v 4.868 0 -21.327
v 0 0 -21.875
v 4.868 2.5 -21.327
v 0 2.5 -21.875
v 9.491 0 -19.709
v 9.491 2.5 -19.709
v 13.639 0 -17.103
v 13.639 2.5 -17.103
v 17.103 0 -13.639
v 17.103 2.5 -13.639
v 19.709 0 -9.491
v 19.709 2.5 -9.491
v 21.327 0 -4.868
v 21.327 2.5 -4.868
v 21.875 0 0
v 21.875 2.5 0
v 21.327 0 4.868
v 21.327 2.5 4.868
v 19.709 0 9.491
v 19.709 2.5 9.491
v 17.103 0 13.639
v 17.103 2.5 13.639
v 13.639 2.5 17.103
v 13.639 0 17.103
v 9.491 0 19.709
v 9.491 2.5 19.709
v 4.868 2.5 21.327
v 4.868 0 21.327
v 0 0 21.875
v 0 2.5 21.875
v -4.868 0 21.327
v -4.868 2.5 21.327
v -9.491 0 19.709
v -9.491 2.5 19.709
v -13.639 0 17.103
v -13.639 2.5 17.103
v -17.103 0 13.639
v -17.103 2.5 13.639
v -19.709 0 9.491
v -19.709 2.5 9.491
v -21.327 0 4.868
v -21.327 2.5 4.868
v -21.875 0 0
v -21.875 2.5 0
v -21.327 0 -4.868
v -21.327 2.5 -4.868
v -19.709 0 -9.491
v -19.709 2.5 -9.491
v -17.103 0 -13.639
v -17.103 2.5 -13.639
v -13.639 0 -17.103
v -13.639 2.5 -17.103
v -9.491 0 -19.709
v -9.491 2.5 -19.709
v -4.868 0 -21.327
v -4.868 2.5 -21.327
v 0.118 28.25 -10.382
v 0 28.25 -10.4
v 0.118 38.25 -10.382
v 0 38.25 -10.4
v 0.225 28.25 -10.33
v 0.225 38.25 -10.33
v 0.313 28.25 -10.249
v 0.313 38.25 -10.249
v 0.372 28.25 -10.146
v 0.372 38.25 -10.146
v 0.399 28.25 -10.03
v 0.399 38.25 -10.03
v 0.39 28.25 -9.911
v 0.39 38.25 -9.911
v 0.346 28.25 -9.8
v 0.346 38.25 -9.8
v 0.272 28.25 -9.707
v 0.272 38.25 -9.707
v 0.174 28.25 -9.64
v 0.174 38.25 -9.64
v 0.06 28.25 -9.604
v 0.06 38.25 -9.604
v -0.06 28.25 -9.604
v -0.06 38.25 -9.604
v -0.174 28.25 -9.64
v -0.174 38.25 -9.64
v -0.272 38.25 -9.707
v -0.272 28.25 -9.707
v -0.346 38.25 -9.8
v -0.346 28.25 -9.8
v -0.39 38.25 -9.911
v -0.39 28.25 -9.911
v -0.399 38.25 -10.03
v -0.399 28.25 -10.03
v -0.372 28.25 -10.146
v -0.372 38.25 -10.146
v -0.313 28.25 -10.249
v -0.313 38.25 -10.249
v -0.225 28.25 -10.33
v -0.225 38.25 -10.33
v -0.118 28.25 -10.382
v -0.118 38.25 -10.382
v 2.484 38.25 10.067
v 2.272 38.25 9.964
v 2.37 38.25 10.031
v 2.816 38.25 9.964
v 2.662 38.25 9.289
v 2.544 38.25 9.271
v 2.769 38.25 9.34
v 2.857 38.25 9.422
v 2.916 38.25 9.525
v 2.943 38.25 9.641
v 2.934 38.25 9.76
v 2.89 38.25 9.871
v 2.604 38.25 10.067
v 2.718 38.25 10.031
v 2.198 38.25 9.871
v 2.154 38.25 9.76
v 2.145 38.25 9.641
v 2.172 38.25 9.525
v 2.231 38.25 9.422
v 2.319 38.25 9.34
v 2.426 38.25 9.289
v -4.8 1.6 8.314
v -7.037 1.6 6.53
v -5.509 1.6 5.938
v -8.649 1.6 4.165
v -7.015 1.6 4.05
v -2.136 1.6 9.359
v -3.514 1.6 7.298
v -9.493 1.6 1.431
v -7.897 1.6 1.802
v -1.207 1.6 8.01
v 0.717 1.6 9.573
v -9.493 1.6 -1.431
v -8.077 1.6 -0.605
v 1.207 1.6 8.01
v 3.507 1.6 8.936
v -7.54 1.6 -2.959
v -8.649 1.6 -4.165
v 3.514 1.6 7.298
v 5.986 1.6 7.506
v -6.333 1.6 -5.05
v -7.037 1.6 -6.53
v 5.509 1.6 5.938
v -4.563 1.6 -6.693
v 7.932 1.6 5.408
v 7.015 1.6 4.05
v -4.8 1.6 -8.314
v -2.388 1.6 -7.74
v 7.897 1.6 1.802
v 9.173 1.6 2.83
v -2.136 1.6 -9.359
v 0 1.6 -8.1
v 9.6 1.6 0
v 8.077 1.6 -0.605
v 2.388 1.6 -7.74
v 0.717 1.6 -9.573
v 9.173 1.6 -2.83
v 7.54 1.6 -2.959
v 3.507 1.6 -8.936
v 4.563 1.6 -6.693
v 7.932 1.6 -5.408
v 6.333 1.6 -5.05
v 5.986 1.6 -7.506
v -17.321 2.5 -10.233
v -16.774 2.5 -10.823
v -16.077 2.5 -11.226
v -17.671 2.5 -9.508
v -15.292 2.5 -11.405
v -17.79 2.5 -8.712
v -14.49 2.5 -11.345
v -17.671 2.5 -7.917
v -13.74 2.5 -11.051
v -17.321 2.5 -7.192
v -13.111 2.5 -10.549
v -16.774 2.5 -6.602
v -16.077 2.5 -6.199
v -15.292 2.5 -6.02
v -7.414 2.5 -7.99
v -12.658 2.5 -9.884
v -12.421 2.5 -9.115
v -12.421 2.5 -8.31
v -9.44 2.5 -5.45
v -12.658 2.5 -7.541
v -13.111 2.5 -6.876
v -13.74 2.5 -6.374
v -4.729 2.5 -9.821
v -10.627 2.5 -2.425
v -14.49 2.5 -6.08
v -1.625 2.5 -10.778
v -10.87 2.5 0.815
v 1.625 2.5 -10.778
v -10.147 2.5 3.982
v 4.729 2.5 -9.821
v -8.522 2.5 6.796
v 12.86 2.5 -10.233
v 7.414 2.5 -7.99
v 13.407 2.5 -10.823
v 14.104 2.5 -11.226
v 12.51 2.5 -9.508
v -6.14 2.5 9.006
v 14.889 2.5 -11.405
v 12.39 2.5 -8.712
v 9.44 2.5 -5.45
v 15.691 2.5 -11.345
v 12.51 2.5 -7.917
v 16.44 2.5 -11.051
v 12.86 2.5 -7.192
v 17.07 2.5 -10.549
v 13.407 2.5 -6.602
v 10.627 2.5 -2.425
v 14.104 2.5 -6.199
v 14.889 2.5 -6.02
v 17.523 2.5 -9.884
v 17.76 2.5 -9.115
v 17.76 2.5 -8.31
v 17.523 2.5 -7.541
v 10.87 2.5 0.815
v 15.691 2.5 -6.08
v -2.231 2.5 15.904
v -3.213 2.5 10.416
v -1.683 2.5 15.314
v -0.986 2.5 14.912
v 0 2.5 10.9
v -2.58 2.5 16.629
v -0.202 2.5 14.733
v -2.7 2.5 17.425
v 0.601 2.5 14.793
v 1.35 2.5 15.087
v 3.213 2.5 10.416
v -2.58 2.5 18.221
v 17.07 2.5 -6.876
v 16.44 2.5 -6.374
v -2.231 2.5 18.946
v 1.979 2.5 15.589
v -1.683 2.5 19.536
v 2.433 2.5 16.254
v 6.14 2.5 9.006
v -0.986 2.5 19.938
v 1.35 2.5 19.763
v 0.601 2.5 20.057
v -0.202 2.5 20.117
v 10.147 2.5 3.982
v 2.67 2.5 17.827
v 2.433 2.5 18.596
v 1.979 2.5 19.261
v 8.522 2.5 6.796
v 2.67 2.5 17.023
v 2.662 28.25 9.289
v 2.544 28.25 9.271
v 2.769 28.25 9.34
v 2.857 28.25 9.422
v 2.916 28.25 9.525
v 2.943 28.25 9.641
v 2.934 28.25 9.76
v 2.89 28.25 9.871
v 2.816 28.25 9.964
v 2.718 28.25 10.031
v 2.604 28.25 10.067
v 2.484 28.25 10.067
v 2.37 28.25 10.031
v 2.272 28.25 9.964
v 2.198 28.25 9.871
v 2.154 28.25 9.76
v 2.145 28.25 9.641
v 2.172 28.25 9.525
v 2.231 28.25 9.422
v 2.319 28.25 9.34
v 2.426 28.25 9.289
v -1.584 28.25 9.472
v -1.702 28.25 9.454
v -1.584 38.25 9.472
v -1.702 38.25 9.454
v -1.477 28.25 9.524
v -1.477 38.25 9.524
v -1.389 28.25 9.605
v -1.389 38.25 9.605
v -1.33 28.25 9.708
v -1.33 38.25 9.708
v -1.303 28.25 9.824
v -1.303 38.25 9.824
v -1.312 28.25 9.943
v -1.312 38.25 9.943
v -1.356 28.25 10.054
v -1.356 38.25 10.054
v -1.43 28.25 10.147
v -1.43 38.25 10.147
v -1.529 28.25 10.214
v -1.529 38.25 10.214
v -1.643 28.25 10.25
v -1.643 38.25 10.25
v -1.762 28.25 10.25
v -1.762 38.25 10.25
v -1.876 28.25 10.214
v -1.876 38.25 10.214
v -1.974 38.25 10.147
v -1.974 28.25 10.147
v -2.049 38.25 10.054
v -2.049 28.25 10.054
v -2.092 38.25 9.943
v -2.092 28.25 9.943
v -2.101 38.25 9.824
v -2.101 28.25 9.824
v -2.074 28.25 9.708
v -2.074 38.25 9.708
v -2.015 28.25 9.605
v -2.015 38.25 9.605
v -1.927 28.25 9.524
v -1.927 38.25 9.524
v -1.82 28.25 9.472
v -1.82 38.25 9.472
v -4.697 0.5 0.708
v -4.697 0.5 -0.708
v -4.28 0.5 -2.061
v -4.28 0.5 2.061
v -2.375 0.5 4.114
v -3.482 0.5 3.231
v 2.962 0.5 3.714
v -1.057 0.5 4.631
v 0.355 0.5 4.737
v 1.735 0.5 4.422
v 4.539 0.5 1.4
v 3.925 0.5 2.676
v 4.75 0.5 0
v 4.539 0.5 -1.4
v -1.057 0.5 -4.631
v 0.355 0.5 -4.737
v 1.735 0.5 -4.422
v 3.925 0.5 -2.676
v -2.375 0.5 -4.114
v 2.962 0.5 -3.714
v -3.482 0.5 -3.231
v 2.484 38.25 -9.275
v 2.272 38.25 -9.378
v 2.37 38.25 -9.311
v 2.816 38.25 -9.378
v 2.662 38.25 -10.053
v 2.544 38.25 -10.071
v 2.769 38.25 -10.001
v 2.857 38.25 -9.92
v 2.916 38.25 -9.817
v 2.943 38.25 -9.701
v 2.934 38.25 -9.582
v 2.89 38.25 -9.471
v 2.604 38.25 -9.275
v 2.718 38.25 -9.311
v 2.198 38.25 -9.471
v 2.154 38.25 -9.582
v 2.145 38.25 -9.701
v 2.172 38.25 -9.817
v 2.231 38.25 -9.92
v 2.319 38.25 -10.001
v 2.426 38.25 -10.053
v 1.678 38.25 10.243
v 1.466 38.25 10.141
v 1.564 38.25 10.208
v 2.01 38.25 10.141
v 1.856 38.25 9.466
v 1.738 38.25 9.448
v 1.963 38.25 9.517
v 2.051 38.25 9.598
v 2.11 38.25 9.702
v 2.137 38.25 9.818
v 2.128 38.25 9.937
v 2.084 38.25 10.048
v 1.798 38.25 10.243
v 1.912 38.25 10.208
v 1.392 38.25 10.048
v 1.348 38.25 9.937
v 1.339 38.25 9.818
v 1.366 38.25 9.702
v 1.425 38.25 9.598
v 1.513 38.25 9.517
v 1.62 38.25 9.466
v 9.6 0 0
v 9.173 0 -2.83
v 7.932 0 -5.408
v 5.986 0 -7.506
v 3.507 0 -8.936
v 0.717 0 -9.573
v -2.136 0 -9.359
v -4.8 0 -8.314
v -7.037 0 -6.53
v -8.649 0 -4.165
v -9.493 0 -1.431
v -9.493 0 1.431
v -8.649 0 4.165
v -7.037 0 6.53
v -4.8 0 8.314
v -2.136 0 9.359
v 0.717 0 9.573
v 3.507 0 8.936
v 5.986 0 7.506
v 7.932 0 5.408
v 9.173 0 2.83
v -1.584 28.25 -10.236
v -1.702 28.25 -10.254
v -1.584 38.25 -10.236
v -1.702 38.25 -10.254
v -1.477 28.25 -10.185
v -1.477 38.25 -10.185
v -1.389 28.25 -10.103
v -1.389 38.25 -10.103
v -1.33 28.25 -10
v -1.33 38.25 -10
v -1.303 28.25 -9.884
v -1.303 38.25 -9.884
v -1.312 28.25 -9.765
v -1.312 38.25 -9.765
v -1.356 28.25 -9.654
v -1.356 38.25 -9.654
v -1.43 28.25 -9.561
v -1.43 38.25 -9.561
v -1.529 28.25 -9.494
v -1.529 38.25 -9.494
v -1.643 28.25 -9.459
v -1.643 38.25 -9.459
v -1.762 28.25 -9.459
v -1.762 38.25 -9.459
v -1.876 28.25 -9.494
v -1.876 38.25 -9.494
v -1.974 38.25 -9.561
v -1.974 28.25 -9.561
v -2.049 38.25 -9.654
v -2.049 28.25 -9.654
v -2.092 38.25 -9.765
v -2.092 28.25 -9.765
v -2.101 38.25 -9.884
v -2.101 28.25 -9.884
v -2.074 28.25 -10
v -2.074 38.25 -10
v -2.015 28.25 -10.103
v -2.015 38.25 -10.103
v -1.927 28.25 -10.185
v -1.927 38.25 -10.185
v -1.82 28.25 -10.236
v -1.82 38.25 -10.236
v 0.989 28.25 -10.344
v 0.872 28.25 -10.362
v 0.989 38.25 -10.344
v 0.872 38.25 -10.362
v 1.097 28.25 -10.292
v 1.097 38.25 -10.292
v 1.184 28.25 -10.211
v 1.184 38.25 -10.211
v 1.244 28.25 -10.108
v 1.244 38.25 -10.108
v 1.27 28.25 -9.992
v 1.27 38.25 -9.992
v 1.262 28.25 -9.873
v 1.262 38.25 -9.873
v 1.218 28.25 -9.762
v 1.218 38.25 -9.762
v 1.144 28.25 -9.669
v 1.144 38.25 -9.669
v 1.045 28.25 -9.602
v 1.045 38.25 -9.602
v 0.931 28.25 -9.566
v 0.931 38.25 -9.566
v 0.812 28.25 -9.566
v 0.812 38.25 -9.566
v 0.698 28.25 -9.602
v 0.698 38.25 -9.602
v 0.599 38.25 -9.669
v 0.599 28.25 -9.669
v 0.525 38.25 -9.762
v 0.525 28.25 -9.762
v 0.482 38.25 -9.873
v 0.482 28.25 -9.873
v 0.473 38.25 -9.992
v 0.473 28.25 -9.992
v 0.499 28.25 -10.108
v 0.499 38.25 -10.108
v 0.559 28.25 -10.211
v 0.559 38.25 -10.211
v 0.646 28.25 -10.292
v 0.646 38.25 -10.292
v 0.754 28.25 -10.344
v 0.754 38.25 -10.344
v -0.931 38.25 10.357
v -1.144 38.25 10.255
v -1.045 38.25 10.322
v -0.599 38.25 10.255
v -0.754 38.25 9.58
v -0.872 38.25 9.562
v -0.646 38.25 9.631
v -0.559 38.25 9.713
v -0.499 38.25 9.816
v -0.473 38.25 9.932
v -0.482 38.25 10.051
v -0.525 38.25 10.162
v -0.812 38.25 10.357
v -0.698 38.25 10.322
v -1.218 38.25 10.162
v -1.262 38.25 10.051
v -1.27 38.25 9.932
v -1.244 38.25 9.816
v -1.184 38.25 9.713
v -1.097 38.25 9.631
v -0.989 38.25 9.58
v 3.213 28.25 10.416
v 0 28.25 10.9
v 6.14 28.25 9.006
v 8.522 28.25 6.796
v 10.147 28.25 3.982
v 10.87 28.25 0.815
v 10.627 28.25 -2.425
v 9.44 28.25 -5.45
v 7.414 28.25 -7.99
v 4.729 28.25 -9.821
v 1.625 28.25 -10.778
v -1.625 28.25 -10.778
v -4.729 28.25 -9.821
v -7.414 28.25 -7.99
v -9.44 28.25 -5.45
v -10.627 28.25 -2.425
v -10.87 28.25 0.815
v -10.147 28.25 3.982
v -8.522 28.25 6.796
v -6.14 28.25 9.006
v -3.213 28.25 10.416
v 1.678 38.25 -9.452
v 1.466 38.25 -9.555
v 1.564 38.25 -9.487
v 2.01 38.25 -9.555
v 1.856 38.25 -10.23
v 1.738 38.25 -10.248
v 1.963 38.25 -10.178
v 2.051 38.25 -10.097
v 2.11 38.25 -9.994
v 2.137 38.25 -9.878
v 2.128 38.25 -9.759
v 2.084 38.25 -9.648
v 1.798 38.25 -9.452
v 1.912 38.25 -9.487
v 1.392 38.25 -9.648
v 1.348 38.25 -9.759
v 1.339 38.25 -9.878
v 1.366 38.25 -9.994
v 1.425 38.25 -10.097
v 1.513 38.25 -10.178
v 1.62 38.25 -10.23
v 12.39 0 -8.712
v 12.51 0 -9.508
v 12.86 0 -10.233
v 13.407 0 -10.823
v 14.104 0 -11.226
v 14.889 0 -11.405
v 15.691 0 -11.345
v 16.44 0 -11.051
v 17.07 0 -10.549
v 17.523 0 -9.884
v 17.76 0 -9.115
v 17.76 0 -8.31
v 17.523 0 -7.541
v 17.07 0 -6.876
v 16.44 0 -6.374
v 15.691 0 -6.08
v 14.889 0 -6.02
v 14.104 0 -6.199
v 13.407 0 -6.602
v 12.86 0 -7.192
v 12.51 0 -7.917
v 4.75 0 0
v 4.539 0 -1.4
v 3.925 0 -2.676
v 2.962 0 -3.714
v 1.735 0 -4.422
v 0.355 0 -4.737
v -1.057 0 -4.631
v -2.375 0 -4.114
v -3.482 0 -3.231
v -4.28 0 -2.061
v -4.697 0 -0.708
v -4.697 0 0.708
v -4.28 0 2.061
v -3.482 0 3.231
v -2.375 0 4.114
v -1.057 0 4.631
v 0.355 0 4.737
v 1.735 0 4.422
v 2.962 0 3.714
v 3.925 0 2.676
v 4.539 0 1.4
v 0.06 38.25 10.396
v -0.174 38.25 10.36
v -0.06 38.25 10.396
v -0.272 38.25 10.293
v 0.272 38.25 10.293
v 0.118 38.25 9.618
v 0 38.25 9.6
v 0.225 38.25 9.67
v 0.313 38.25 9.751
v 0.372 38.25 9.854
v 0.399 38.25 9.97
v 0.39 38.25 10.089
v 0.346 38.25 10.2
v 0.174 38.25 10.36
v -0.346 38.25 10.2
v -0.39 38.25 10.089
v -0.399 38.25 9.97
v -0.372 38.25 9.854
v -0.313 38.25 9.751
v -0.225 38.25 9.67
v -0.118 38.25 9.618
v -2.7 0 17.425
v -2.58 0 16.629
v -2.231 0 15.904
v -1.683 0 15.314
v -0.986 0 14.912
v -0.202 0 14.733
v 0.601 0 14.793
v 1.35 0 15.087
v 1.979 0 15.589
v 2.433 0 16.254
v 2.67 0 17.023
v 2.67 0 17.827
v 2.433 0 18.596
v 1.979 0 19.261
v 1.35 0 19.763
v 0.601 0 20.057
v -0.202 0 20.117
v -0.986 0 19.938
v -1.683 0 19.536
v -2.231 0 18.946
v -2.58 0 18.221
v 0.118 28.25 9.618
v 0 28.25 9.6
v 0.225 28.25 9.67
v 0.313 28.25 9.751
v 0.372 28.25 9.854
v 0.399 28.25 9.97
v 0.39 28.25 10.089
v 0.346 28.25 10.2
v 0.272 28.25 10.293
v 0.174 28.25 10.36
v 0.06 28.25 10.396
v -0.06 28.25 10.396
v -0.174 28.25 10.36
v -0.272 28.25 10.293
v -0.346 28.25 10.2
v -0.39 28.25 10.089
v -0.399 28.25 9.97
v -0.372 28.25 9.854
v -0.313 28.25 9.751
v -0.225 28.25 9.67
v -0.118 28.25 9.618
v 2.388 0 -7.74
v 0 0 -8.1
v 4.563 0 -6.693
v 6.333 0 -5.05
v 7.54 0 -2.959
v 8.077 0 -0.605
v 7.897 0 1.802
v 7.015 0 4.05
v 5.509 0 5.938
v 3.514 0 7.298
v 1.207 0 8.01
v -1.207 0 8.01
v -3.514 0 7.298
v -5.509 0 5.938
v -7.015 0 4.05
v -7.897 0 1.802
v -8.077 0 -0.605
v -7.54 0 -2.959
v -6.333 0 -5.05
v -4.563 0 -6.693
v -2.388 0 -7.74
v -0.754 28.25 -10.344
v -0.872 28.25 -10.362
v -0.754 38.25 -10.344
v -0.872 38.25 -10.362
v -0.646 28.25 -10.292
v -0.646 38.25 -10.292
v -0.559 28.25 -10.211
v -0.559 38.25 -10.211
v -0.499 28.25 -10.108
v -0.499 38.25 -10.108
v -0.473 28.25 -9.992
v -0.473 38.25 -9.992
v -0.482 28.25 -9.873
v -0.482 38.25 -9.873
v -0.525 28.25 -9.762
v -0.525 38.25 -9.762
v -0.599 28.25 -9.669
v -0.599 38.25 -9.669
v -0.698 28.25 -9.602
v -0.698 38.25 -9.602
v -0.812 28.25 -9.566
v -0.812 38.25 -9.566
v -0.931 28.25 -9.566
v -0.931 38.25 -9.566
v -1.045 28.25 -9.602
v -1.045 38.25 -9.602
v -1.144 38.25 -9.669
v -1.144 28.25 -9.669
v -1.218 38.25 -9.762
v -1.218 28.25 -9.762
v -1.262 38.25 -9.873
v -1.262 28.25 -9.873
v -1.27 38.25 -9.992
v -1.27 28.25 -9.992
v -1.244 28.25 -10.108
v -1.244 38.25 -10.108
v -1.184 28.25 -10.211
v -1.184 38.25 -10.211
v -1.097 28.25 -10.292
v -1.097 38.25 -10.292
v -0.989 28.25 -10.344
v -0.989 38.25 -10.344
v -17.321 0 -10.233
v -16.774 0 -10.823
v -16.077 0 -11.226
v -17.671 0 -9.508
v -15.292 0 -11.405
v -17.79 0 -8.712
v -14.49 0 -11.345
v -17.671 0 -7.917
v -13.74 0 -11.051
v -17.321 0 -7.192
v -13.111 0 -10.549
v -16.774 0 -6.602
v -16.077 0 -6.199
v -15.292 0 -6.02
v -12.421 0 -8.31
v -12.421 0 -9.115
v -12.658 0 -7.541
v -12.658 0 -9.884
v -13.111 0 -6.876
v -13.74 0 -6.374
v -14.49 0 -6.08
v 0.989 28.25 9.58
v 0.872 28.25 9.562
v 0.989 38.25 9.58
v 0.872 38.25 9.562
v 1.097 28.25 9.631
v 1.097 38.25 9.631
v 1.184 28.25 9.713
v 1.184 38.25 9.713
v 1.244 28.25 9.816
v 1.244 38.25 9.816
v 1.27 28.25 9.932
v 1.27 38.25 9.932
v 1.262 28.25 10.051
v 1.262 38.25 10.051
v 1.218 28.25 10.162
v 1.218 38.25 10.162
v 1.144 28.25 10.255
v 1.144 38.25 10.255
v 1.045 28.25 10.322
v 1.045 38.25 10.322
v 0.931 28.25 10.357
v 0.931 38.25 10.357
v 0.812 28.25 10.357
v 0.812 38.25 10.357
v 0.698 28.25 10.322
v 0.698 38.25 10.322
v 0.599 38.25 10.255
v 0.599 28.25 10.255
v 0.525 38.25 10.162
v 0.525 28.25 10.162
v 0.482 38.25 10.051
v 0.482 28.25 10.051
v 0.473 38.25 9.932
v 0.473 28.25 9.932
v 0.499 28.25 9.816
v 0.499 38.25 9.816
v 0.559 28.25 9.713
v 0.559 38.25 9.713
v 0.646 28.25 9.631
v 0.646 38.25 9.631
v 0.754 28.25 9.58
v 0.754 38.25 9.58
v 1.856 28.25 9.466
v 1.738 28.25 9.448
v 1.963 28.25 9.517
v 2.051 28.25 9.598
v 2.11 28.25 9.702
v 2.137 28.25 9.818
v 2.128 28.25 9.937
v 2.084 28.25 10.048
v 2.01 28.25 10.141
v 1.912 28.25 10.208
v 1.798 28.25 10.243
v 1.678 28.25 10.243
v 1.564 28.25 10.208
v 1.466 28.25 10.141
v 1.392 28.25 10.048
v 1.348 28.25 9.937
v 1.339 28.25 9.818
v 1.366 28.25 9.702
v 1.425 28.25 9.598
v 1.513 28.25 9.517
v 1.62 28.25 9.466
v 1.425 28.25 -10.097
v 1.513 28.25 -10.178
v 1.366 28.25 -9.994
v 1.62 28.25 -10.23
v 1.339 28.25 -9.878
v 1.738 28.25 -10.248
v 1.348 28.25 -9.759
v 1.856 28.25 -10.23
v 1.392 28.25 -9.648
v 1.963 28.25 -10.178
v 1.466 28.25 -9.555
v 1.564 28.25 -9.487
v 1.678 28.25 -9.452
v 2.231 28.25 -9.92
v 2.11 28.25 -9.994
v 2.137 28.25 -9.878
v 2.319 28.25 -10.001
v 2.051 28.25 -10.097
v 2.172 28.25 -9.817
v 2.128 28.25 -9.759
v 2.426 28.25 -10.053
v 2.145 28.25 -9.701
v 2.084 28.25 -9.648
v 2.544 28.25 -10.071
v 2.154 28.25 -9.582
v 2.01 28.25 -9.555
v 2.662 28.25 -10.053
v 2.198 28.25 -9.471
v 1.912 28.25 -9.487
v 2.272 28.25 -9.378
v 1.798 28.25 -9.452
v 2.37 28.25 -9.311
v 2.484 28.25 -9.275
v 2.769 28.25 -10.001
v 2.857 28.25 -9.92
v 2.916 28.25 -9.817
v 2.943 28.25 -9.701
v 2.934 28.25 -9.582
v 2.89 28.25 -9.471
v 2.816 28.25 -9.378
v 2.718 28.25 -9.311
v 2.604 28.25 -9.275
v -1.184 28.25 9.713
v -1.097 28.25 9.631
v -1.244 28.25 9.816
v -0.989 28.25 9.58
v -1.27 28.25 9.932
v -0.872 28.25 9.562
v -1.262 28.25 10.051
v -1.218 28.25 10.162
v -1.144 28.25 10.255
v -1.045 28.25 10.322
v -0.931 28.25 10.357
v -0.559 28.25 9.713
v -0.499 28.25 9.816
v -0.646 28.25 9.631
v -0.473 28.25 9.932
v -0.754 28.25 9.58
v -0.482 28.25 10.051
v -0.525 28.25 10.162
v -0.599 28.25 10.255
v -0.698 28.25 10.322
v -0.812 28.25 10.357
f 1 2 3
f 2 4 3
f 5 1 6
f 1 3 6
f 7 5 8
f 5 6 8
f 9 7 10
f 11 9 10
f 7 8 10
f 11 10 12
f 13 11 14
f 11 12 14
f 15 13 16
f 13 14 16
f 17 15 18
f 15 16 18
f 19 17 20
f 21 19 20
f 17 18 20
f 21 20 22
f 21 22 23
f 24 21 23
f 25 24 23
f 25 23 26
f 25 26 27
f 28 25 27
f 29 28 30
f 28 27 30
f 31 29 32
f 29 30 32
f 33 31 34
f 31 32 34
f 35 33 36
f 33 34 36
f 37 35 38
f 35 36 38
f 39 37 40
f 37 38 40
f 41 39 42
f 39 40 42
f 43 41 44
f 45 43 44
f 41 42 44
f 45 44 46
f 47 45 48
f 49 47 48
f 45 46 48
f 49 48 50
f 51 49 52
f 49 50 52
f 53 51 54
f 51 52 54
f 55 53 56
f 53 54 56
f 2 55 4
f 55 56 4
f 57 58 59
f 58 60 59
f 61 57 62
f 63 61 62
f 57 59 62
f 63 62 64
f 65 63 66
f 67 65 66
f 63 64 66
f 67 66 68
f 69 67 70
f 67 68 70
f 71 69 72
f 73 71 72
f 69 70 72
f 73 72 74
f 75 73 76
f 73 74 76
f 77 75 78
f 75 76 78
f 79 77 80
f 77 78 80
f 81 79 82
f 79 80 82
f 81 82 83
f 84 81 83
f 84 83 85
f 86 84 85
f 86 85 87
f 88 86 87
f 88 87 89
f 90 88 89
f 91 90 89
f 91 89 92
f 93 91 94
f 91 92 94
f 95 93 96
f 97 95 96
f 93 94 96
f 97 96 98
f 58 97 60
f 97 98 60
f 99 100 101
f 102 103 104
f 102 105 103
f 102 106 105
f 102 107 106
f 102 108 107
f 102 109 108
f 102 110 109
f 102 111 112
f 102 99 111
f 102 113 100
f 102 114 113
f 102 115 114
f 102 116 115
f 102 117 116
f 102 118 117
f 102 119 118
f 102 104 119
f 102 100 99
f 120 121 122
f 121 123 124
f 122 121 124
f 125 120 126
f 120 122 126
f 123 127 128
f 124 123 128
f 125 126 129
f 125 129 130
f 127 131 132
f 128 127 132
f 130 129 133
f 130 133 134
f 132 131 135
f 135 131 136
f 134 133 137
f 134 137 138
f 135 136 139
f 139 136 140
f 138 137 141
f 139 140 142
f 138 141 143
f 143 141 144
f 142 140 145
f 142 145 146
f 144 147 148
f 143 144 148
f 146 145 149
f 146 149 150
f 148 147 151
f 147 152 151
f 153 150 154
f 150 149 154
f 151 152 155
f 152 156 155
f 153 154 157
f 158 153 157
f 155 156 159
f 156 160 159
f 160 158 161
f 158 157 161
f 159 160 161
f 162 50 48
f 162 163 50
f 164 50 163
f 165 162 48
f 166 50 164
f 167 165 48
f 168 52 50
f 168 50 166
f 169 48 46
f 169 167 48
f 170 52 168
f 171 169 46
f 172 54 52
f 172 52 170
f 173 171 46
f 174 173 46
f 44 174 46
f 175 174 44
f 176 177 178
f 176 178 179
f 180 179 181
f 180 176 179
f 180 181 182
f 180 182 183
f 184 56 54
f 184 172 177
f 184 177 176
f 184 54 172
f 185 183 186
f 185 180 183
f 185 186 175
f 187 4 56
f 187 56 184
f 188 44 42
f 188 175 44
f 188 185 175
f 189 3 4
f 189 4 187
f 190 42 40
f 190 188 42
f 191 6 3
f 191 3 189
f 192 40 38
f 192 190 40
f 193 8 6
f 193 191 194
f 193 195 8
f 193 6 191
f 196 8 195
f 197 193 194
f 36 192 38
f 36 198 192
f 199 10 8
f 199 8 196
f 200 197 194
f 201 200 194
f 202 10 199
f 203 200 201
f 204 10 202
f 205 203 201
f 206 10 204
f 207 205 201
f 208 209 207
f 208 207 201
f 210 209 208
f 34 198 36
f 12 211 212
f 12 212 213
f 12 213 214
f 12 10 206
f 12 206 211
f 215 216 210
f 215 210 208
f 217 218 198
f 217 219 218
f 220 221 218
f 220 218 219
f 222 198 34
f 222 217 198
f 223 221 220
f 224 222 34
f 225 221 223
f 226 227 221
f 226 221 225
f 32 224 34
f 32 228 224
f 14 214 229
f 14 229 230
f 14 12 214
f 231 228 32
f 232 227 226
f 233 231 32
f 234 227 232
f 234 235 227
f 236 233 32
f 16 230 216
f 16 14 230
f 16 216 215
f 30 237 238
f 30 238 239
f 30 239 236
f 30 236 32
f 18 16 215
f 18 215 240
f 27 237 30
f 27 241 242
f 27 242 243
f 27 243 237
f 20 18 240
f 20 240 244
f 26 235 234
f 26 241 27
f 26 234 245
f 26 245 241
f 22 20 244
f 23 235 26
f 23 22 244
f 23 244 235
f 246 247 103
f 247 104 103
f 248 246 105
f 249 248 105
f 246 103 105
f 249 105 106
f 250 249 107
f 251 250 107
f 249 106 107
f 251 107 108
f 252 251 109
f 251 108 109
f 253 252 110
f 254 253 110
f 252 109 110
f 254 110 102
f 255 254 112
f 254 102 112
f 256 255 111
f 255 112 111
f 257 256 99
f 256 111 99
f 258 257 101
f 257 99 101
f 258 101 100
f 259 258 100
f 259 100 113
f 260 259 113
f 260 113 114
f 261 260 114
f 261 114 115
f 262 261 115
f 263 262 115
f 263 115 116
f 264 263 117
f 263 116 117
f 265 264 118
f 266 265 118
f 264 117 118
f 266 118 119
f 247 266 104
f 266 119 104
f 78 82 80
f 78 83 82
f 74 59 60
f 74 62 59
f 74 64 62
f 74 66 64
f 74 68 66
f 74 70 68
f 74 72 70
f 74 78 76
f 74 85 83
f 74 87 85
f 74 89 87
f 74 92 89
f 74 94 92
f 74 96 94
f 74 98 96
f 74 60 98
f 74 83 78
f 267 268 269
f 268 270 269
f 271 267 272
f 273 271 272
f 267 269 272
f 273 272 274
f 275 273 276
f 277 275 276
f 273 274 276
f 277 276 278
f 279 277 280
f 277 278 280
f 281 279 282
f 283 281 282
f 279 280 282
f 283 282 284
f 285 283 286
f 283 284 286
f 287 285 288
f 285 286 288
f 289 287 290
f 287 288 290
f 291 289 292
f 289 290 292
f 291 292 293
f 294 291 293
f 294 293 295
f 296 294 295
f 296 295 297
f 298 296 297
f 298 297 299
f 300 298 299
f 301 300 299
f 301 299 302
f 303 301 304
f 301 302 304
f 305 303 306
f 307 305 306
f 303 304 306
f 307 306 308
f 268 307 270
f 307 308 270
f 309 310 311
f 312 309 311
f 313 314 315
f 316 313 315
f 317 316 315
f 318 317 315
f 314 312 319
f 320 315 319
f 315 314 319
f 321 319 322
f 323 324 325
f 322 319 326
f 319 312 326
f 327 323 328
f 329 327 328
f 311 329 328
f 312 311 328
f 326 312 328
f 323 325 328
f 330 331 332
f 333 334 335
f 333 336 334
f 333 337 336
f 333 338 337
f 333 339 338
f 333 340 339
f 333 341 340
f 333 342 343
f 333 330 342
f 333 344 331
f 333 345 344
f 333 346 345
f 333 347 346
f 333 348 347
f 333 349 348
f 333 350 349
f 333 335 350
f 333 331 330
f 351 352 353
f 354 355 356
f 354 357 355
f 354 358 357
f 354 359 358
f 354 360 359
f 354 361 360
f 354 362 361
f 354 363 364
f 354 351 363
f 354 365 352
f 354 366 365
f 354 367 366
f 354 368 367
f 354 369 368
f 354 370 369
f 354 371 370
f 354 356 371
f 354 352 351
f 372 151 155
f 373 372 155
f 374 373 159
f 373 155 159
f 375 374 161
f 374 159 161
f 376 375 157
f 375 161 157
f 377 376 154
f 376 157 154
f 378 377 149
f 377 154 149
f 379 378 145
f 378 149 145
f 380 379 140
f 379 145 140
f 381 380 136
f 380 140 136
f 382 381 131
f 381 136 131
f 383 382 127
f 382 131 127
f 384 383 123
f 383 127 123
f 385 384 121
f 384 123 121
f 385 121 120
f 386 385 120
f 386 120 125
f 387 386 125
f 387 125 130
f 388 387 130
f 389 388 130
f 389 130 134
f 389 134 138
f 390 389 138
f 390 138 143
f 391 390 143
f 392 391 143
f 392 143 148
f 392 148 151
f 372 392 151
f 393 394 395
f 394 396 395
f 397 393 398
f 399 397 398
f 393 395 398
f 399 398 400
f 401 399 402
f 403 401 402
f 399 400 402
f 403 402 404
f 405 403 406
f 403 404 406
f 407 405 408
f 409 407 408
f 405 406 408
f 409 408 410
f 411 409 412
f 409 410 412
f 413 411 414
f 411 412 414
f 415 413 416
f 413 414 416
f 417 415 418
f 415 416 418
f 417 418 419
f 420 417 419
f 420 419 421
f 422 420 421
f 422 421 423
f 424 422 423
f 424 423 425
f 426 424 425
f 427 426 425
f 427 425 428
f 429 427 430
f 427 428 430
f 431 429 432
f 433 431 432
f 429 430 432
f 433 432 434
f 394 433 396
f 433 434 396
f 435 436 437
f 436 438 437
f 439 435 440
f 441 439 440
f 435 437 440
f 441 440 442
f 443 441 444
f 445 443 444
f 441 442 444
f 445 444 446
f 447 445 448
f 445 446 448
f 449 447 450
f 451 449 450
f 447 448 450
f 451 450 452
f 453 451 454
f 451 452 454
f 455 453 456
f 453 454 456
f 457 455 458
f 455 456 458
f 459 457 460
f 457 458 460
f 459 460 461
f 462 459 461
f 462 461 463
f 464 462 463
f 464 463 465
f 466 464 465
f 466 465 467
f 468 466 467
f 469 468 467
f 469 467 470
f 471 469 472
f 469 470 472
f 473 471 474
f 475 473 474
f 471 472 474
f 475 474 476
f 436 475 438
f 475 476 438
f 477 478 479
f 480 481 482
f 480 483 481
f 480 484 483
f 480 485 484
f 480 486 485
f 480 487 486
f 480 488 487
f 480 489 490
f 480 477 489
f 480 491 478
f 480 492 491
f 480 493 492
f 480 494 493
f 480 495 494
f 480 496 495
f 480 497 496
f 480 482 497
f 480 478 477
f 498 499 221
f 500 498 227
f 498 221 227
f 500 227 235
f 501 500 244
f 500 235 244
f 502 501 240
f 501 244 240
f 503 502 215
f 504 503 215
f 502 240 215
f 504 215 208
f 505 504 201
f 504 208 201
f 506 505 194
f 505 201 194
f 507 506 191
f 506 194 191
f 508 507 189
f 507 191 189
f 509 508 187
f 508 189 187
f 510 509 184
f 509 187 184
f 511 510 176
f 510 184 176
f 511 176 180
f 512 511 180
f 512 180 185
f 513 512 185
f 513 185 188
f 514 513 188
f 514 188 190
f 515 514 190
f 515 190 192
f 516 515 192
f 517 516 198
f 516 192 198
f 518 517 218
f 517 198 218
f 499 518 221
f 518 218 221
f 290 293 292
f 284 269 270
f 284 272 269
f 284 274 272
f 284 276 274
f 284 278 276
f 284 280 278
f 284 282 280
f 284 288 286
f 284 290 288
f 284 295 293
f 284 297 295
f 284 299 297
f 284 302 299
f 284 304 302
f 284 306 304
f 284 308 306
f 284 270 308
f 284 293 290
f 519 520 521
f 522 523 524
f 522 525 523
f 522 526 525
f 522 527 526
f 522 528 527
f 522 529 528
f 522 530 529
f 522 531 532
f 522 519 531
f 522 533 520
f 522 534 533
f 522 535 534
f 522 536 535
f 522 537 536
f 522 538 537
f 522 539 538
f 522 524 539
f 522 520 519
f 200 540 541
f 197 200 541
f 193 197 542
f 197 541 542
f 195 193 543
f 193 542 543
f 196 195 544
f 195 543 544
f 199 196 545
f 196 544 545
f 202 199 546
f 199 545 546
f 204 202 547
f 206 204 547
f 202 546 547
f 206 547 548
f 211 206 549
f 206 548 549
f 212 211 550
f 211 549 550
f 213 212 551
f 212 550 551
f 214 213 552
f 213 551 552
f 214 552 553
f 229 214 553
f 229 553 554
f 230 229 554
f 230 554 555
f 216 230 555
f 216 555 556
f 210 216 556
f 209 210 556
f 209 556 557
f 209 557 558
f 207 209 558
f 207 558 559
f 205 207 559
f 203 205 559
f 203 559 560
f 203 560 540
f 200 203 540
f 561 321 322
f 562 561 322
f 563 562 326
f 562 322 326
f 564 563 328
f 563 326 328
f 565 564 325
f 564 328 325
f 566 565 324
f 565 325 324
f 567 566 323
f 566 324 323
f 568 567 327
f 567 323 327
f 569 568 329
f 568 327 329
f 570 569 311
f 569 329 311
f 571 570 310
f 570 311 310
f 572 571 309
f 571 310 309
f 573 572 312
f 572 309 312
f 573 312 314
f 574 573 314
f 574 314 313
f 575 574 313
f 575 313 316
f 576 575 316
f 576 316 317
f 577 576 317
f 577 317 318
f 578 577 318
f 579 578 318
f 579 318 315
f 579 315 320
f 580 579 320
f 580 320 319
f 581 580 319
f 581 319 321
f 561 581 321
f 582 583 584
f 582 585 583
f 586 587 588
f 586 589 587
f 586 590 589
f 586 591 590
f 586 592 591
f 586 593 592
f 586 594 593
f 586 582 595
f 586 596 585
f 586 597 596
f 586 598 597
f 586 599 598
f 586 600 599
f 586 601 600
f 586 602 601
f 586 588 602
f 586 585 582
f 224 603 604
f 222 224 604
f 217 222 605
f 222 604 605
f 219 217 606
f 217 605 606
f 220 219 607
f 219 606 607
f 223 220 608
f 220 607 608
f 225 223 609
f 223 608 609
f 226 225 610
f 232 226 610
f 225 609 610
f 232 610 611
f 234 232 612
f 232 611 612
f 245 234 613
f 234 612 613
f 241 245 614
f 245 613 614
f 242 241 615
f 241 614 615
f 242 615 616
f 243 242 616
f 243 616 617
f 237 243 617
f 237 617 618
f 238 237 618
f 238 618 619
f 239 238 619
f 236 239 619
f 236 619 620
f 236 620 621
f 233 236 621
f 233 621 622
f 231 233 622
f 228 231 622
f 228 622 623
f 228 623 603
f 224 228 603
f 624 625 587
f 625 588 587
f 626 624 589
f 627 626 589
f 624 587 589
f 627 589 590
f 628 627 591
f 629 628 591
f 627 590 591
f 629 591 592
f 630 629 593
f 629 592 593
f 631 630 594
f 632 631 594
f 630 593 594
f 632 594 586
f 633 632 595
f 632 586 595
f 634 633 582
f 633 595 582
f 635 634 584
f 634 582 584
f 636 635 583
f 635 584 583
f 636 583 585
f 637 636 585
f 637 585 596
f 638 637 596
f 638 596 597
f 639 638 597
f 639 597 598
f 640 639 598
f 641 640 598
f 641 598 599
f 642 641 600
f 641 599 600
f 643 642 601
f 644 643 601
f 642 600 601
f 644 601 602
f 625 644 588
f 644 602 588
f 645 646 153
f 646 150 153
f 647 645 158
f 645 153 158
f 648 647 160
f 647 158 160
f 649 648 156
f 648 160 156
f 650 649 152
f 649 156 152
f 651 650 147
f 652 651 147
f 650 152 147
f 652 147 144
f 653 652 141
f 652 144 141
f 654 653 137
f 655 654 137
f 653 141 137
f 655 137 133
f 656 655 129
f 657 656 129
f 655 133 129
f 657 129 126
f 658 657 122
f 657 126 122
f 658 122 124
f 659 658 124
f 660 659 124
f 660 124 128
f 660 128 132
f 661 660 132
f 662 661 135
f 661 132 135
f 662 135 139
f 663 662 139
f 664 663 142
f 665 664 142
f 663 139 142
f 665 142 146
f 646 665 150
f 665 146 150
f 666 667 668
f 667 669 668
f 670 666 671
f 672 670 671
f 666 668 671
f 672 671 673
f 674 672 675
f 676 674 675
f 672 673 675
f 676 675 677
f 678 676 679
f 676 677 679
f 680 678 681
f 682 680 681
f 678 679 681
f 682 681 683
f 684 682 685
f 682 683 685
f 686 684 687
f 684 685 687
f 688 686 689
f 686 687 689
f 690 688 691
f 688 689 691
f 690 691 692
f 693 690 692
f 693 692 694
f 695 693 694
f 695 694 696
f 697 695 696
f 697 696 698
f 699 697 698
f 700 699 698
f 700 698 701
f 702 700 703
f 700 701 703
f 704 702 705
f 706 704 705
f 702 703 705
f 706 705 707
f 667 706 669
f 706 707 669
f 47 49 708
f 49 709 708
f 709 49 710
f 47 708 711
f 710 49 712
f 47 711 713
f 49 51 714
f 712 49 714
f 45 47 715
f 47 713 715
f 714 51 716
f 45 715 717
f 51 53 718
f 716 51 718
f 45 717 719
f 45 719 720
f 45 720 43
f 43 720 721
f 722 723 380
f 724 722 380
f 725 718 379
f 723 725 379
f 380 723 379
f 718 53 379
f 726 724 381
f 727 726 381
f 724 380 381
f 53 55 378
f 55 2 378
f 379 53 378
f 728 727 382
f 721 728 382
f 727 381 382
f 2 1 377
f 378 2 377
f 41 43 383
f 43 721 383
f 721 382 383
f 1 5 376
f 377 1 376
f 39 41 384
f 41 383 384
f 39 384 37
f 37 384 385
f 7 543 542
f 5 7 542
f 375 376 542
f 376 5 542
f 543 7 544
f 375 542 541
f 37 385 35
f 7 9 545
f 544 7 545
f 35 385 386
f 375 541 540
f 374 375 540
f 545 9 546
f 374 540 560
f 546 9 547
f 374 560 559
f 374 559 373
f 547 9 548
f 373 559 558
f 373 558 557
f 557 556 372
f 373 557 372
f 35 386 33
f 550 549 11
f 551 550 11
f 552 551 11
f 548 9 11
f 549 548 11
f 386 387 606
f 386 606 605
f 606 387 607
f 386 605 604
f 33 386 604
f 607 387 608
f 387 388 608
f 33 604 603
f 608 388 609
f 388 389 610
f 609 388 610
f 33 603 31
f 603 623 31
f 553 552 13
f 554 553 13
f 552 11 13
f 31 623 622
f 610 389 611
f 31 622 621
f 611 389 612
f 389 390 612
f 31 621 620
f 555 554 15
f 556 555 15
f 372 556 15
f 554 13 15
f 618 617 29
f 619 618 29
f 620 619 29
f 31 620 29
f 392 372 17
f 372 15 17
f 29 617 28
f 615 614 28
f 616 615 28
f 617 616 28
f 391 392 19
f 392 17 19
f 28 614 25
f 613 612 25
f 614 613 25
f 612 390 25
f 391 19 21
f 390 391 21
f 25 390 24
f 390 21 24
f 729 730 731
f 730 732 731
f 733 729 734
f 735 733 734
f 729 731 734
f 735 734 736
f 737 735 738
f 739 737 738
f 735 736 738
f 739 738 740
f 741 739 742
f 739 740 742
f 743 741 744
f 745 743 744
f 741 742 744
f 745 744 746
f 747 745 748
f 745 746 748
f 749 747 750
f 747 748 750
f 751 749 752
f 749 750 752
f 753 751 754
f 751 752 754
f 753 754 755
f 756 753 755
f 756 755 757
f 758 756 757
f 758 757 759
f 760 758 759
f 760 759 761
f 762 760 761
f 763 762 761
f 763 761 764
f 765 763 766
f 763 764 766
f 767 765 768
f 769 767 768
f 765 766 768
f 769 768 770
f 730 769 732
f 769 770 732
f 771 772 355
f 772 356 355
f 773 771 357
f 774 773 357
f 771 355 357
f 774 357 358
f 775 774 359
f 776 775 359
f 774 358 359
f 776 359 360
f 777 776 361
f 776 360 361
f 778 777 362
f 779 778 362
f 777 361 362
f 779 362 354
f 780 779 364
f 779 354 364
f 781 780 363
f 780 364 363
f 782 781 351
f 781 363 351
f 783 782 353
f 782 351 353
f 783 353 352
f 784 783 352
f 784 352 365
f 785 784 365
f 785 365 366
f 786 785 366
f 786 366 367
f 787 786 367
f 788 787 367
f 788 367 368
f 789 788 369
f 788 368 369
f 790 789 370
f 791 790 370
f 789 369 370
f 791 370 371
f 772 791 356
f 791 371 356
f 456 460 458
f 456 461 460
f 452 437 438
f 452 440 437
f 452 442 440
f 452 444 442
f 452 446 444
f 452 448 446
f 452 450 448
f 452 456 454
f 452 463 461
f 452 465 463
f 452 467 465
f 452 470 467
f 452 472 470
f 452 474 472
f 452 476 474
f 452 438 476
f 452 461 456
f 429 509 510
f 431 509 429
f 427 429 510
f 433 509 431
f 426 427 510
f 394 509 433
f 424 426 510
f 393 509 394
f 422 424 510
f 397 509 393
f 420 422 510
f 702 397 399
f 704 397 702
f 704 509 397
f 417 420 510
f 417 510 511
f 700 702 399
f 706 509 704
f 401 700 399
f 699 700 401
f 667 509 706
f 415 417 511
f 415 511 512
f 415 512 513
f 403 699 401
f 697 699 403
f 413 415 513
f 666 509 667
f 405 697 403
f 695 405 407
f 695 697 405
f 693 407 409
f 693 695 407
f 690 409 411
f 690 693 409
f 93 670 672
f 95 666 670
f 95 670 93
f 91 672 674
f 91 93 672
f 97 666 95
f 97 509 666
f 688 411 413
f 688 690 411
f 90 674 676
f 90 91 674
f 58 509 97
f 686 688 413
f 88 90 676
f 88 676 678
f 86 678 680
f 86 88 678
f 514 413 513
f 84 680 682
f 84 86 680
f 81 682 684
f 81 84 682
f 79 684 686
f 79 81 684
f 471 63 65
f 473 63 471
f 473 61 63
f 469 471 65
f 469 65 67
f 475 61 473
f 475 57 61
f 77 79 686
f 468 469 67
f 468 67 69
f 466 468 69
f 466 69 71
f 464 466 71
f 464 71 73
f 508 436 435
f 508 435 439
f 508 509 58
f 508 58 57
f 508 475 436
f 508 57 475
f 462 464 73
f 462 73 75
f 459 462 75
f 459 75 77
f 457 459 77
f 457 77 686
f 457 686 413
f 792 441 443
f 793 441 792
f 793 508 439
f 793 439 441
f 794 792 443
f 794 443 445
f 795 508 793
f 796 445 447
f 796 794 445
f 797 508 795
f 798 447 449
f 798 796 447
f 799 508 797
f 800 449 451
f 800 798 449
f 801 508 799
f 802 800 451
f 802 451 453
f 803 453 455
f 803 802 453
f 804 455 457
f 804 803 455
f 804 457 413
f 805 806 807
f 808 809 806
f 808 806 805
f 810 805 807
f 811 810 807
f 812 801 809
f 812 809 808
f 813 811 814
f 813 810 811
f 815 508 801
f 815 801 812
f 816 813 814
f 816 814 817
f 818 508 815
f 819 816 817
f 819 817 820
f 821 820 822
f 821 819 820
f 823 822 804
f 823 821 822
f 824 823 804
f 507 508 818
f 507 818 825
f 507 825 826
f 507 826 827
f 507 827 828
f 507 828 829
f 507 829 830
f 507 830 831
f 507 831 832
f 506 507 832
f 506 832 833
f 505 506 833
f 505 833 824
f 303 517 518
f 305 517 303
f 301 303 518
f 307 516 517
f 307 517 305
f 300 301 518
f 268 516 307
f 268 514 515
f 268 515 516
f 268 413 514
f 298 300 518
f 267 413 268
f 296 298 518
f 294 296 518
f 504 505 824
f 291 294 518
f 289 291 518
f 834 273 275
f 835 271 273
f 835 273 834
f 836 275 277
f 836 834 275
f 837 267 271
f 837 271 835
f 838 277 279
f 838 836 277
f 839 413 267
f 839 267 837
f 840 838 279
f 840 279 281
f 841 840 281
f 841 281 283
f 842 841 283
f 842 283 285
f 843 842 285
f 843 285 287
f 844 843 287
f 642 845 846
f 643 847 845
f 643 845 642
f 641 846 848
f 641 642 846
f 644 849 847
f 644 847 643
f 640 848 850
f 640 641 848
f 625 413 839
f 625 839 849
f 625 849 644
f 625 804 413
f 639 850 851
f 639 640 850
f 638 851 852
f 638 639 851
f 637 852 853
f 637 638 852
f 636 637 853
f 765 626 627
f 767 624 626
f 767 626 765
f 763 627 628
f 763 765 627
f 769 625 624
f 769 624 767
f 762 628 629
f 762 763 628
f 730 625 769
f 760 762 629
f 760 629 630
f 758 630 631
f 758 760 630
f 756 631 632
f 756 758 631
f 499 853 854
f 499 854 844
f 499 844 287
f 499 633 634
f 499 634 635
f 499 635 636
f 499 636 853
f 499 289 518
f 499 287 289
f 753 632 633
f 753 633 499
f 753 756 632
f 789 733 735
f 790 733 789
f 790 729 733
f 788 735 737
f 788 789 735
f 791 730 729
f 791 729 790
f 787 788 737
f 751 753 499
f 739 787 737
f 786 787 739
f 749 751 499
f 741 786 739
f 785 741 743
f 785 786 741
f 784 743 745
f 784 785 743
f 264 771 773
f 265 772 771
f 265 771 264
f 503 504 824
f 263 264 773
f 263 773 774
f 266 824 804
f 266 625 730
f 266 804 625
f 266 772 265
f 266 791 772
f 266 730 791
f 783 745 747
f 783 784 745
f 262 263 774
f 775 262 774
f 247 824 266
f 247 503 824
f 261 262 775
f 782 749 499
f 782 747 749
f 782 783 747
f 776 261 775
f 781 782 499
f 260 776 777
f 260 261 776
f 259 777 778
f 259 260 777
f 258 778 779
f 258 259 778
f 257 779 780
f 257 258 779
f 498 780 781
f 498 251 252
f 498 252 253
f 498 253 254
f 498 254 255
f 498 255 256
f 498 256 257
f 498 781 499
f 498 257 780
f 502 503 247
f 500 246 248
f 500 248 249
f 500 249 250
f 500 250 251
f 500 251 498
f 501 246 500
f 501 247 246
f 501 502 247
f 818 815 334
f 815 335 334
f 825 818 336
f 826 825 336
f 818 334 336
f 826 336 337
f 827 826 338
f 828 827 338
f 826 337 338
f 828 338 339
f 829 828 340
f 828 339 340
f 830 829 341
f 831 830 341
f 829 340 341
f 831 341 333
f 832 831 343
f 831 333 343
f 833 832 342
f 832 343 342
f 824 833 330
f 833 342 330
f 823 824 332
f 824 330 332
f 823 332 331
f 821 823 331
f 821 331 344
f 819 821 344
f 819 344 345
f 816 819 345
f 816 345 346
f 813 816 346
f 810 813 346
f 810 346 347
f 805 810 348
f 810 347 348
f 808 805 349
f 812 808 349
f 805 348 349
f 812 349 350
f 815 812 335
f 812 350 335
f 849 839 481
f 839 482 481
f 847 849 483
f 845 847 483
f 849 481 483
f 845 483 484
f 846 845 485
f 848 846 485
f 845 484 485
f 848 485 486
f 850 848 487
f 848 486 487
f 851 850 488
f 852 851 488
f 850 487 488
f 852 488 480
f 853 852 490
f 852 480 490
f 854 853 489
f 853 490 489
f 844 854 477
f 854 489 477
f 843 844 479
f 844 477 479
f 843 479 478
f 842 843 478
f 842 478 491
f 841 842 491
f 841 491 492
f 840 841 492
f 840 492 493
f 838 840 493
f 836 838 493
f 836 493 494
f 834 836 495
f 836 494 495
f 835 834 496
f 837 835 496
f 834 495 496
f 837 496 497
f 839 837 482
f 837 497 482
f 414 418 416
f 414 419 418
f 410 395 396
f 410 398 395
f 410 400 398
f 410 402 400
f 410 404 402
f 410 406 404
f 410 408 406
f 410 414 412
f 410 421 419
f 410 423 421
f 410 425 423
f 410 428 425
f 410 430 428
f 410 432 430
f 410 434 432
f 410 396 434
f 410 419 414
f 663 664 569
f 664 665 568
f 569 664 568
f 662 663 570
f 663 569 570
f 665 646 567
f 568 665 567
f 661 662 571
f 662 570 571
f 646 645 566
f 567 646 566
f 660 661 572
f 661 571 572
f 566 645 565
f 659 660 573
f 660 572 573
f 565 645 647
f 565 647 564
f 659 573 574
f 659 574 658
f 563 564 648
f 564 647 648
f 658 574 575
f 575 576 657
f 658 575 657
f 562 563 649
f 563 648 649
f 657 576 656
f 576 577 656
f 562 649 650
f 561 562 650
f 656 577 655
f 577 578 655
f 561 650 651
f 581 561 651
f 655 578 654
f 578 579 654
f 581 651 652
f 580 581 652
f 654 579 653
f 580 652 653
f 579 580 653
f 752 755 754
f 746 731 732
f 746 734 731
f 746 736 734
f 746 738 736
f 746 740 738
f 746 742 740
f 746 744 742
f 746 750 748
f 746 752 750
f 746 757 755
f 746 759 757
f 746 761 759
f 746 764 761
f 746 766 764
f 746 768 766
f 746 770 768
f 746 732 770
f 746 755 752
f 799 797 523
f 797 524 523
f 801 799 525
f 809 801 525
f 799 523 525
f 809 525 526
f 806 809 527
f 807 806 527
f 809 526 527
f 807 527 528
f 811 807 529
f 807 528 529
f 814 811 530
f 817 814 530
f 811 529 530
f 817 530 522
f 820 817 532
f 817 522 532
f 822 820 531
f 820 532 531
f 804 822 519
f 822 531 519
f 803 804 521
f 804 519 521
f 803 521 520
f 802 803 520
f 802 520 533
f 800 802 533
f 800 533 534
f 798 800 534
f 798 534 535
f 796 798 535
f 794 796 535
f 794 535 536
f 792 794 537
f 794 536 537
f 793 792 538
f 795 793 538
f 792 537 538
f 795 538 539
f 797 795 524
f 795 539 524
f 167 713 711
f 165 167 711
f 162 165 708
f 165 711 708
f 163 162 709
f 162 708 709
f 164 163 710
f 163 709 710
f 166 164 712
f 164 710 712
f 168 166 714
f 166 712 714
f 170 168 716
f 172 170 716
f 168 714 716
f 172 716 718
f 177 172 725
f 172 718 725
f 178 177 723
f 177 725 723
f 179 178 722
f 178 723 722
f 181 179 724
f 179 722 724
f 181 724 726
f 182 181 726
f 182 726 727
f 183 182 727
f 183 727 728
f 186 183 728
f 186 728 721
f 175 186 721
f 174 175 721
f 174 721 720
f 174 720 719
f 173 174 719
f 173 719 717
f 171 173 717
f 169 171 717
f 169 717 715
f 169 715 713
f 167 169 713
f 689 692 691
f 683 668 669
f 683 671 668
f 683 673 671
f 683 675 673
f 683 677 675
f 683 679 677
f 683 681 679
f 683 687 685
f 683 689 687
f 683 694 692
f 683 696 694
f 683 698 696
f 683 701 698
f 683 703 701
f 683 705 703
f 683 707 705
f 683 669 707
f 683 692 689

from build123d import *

# Parameters (mm, degrees)
SKETCH_1_W                  = 21.875
SKETCH_1_H                  = 2.5
SKETCH_2_R                  = 10.9
EXTRUDE_1_DEPTH             = 25.75
HOLE_WIZARD_M18_1_D         = 19.2
HOLE_WIZARD_M18_1_DEPTH     = 1.6
SKETCH_5_W                  = 8.1
SKETCH_5_H                  = 1.6
SKETCH_6_W                  = 0.4
SKETCH_6_H                  = 10
SKETCH_7_W                  = 0.4
SKETCH_7_H                  = 10
SKETCH_8_W                  = 0.4
SKETCH_8_H                  = 10
SKETCH_9_W                  = 0.4
SKETCH_9_H                  = 10
SKETCH_10_W                 = 0.4
SKETCH_10_H                 = 10
SKETCH_11_W                 = 0.4
SKETCH_11_H                 = 10
SKETCH_12_W                 = 0.4
SKETCH_12_H                 = 10
SKETCH_13_W                 = 0.4
SKETCH_13_H                 = 10
SKETCH_14_W                 = 0.4
SKETCH_14_H                 = 10
SKETCH_15_W                 = 0.4
SKETCH_15_H                 = 10
SKETCH_16_W                 = 0.4
SKETCH_16_H                 = 10
SKETCH_17_W                 = 0.4
SKETCH_17_H                 = 10
HOLE_WIZARD_5_4_5_4_1_D     = 5.4
HOLE_WIZARD_9_5_9_5_1_D     = 9.5
HOLE_WIZARD_9_5_9_5_1_DEPTH = 0.5


with BuildPart() as part:
    # 草图1 → 旋转1 (revolve)
    with BuildSketch(Plane.XY, mode=Mode.PRIVATE) as revolve_1_sk:
        with Locations((10.9375, 1.25)):
            Rectangle(SKETCH_1_W, SKETCH_1_H)
    revolve(revolve_1_sk.sketch.rotate(Axis((0, 2.5, 0), (0, -1, 0)), 270), axis=Axis((0, 2.5, 0), (0, -1, 0)))

    # 草图2 → 凸台-拉伸1 (add)
    with BuildSketch(Plane(origin=(0, 2.5, 0), x_dir=(-1, 0, 0), z_dir=(0, 1, 0))):
        with Locations(Location((0, 0, 0), (0, 0, 90))):
            Circle(SKETCH_2_R)
    extrude(amount=EXTRUDE_1_DEPTH)

    # M18 间隙孔1
    with Locations(Plane(origin=(0, 0, 0), x_dir=(-1, 0, 0), z_dir=(0, -1, 0))):
        with Locations((0, 0)):
            Hole(HOLE_WIZARD_M18_1_D / 2, depth=HOLE_WIZARD_M18_1_DEPTH)

    # 草图5 → 旋转2 (revolve)
    with BuildSketch(Plane.XY, mode=Mode.PRIVATE) as revolve_2_sk:
        with Locations((4.05, 0.8)):
            Rectangle(SKETCH_5_W, SKETCH_5_H)
    revolve(revolve_2_sk.sketch.rotate(Axis((0, 1.6, 0), (0, -1, 0)), 270), axis=Axis((0, 1.6, 0), (0, -1, 0)))

    # 草图6 → 旋转3 (revolve)
    with BuildSketch(Plane.XY.offset(9.847808943), mode=Mode.PRIVATE) as revolve_3_sk:
        with Locations((1.938004324, 33.25)):
            Rectangle(SKETCH_6_W, SKETCH_6_H)
    revolve(revolve_3_sk.sketch.rotate(Axis((1.738004324, 38.25, 9.847808943), (0, -1, 0)), 270), axis=Axis((1.738004324, 38.25, 9.847808943), (0, -1, 0)))

    # 草图7 → 旋转4 (revolve)
    with BuildSketch(Plane.XY.offset(9.854071628), mode=Mode.PRIVATE) as revolve_4_sk:
        with Locations((-1.502137581, 33.25)):
            Rectangle(SKETCH_7_W, SKETCH_7_H)
    revolve(revolve_4_sk.sketch.rotate(Axis((-1.702137581, 38.25, 9.854071628), (0, -1, 0)), 270), axis=Axis((-1.702137581, 38.25, 9.854071628), (0, -1, 0)))

    # 草图8 → 旋转5 (revolve)
    with BuildSketch(Plane.XY.offset(9.961946981), mode=Mode.PRIVATE) as revolve_5_sk:
        with Locations((-0.671557427, 33.25)):
            Rectangle(SKETCH_8_W, SKETCH_8_H)
    revolve(revolve_5_sk.sketch.rotate(Axis((-0.871557427, 38.25, 9.961946981), (0, -1, 0)), 270), axis=Axis((-0.871557427, 38.25, 9.961946981), (0, -1, 0)))

    # 草图9 → 旋转6 (revolve)
    with BuildSketch(Plane.XY.offset(9.961946981), mode=Mode.PRIVATE) as revolve_6_sk:
        with Locations((1.071557427, 33.25)):
            Rectangle(SKETCH_9_W, SKETCH_9_H)
    revolve(revolve_6_sk.sketch.rotate(Axis((0.871557427, 38.25, 9.961946981), (0, -1, 0)), 270), axis=Axis((0.871557427, 38.25, 9.961946981), (0, -1, 0)))

    # 草图10 → 旋转7 (revolve)
    with BuildSketch(Plane.XY.offset(10), mode=Mode.PRIVATE) as revolve_7_sk:
        with Locations((0.2, 33.25)):
            Rectangle(SKETCH_10_W, SKETCH_10_H)
    revolve(revolve_7_sk.sketch.rotate(Axis((0, 38.25, 10), (0, -1, 0)), 270), axis=Axis((0, 38.25, 10), (0, -1, 0)))

    # 草图11 → 旋转8 (revolve)
    with BuildSketch(Plane.XY.offset(-9.670983902), mode=Mode.PRIVATE) as revolve_8_sk:
        with Locations((2.744026408, 33.25)):
            Rectangle(SKETCH_11_W, SKETCH_11_H)
    revolve(revolve_8_sk.sketch.rotate(Axis((2.544026408, 38.25, -9.670983902), (0, -1, 0)), 270), axis=Axis((2.544026408, 38.25, -9.670983902), (0, -1, 0)))

    # 草图12 → 旋转9 (revolve)
    with BuildSketch(Plane.XY.offset(-9.847808943), mode=Mode.PRIVATE) as revolve_9_sk:
        with Locations((1.938004324, 33.25)):
            Rectangle(SKETCH_12_W, SKETCH_12_H)
    revolve(revolve_9_sk.sketch.rotate(Axis((1.738004324, 38.25, -9.847808943), (0, -1, 0)), 270), axis=Axis((1.738004324, 38.25, -9.847808943), (0, -1, 0)))

    # 草图13 → 旋转10 (revolve)
    with BuildSketch(Plane.XY.offset(-9.854071628), mode=Mode.PRIVATE) as revolve_10_sk:
        with Locations((-1.502137581, 33.25)):
            Rectangle(SKETCH_13_W, SKETCH_13_H)
    revolve(revolve_10_sk.sketch.rotate(Axis((-1.702137581, 38.25, -9.854071628), (0, -1, 0)), 270), axis=Axis((-1.702137581, 38.25, -9.854071628), (0, -1, 0)))

    # 草图14 → 旋转11 (revolve)
    with BuildSketch(Plane.XY.offset(-9.961946981), mode=Mode.PRIVATE) as revolve_11_sk:
        with Locations((-0.671557427, 33.25)):
            Rectangle(SKETCH_14_W, SKETCH_14_H)
    revolve(revolve_11_sk.sketch.rotate(Axis((-0.871557427, 38.25, -9.961946981), (0, -1, 0)), 270), axis=Axis((-0.871557427, 38.25, -9.961946981), (0, -1, 0)))

    # 草图15 → 旋转12 (revolve)
    with BuildSketch(Plane.XY.offset(-9.961946981), mode=Mode.PRIVATE) as revolve_12_sk:
        with Locations((1.071557427, 33.25)):
            Rectangle(SKETCH_15_W, SKETCH_15_H)
    revolve(revolve_12_sk.sketch.rotate(Axis((0.871557427, 38.25, -9.961946981), (0, -1, 0)), 270), axis=Axis((0.871557427, 38.25, -9.961946981), (0, -1, 0)))

    # 草图16 → 旋转13 (revolve)
    with BuildSketch(Plane.XY.offset(-10), mode=Mode.PRIVATE) as revolve_13_sk:
        with Locations((0.2, 33.25)):
            Rectangle(SKETCH_16_W, SKETCH_16_H)
    revolve(revolve_13_sk.sketch.rotate(Axis((0, 38.25, -10), (0, -1, 0)), 270), axis=Axis((0, 38.25, -10), (0, -1, 0)))

    # 草图17 → 旋转14 (revolve)
    with BuildSketch(Plane.XY.offset(9.670983902), mode=Mode.PRIVATE) as revolve_14_sk:
        with Locations((2.744026408, 33.25)):
            Rectangle(SKETCH_17_W, SKETCH_17_H)
    revolve(revolve_14_sk.sketch.rotate(Axis((2.544026408, 38.25, 9.670983902), (0, -1, 0)), 270), axis=Axis((2.544026408, 38.25, 9.670983902), (0, -1, 0)))

    # Ø5.4 (5.4) 直径孔1 (through all)
    with Locations(Plane(origin=(0, 2.5, 0), x_dir=(1, 0, 0), z_dir=(0, 1, 0))):
        with Locations((0, -17.425), (-15.090492661, 8.7125), (15.090492661, 8.7125)):
            Hole(HOLE_WIZARD_5_4_5_4_1_D / 2)

    # Ø9.5 (9.5) 直径孔1
    with Locations(Plane(origin=(0, 0, 0), x_dir=(-1, 0, 0), z_dir=(0, -1, 0))):
        with Locations((0, 0)):
            Hole(HOLE_WIZARD_9_5_9_5_1_D / 2, depth=HOLE_WIZARD_9_5_9_5_1_DEPTH)


solid = part.part
